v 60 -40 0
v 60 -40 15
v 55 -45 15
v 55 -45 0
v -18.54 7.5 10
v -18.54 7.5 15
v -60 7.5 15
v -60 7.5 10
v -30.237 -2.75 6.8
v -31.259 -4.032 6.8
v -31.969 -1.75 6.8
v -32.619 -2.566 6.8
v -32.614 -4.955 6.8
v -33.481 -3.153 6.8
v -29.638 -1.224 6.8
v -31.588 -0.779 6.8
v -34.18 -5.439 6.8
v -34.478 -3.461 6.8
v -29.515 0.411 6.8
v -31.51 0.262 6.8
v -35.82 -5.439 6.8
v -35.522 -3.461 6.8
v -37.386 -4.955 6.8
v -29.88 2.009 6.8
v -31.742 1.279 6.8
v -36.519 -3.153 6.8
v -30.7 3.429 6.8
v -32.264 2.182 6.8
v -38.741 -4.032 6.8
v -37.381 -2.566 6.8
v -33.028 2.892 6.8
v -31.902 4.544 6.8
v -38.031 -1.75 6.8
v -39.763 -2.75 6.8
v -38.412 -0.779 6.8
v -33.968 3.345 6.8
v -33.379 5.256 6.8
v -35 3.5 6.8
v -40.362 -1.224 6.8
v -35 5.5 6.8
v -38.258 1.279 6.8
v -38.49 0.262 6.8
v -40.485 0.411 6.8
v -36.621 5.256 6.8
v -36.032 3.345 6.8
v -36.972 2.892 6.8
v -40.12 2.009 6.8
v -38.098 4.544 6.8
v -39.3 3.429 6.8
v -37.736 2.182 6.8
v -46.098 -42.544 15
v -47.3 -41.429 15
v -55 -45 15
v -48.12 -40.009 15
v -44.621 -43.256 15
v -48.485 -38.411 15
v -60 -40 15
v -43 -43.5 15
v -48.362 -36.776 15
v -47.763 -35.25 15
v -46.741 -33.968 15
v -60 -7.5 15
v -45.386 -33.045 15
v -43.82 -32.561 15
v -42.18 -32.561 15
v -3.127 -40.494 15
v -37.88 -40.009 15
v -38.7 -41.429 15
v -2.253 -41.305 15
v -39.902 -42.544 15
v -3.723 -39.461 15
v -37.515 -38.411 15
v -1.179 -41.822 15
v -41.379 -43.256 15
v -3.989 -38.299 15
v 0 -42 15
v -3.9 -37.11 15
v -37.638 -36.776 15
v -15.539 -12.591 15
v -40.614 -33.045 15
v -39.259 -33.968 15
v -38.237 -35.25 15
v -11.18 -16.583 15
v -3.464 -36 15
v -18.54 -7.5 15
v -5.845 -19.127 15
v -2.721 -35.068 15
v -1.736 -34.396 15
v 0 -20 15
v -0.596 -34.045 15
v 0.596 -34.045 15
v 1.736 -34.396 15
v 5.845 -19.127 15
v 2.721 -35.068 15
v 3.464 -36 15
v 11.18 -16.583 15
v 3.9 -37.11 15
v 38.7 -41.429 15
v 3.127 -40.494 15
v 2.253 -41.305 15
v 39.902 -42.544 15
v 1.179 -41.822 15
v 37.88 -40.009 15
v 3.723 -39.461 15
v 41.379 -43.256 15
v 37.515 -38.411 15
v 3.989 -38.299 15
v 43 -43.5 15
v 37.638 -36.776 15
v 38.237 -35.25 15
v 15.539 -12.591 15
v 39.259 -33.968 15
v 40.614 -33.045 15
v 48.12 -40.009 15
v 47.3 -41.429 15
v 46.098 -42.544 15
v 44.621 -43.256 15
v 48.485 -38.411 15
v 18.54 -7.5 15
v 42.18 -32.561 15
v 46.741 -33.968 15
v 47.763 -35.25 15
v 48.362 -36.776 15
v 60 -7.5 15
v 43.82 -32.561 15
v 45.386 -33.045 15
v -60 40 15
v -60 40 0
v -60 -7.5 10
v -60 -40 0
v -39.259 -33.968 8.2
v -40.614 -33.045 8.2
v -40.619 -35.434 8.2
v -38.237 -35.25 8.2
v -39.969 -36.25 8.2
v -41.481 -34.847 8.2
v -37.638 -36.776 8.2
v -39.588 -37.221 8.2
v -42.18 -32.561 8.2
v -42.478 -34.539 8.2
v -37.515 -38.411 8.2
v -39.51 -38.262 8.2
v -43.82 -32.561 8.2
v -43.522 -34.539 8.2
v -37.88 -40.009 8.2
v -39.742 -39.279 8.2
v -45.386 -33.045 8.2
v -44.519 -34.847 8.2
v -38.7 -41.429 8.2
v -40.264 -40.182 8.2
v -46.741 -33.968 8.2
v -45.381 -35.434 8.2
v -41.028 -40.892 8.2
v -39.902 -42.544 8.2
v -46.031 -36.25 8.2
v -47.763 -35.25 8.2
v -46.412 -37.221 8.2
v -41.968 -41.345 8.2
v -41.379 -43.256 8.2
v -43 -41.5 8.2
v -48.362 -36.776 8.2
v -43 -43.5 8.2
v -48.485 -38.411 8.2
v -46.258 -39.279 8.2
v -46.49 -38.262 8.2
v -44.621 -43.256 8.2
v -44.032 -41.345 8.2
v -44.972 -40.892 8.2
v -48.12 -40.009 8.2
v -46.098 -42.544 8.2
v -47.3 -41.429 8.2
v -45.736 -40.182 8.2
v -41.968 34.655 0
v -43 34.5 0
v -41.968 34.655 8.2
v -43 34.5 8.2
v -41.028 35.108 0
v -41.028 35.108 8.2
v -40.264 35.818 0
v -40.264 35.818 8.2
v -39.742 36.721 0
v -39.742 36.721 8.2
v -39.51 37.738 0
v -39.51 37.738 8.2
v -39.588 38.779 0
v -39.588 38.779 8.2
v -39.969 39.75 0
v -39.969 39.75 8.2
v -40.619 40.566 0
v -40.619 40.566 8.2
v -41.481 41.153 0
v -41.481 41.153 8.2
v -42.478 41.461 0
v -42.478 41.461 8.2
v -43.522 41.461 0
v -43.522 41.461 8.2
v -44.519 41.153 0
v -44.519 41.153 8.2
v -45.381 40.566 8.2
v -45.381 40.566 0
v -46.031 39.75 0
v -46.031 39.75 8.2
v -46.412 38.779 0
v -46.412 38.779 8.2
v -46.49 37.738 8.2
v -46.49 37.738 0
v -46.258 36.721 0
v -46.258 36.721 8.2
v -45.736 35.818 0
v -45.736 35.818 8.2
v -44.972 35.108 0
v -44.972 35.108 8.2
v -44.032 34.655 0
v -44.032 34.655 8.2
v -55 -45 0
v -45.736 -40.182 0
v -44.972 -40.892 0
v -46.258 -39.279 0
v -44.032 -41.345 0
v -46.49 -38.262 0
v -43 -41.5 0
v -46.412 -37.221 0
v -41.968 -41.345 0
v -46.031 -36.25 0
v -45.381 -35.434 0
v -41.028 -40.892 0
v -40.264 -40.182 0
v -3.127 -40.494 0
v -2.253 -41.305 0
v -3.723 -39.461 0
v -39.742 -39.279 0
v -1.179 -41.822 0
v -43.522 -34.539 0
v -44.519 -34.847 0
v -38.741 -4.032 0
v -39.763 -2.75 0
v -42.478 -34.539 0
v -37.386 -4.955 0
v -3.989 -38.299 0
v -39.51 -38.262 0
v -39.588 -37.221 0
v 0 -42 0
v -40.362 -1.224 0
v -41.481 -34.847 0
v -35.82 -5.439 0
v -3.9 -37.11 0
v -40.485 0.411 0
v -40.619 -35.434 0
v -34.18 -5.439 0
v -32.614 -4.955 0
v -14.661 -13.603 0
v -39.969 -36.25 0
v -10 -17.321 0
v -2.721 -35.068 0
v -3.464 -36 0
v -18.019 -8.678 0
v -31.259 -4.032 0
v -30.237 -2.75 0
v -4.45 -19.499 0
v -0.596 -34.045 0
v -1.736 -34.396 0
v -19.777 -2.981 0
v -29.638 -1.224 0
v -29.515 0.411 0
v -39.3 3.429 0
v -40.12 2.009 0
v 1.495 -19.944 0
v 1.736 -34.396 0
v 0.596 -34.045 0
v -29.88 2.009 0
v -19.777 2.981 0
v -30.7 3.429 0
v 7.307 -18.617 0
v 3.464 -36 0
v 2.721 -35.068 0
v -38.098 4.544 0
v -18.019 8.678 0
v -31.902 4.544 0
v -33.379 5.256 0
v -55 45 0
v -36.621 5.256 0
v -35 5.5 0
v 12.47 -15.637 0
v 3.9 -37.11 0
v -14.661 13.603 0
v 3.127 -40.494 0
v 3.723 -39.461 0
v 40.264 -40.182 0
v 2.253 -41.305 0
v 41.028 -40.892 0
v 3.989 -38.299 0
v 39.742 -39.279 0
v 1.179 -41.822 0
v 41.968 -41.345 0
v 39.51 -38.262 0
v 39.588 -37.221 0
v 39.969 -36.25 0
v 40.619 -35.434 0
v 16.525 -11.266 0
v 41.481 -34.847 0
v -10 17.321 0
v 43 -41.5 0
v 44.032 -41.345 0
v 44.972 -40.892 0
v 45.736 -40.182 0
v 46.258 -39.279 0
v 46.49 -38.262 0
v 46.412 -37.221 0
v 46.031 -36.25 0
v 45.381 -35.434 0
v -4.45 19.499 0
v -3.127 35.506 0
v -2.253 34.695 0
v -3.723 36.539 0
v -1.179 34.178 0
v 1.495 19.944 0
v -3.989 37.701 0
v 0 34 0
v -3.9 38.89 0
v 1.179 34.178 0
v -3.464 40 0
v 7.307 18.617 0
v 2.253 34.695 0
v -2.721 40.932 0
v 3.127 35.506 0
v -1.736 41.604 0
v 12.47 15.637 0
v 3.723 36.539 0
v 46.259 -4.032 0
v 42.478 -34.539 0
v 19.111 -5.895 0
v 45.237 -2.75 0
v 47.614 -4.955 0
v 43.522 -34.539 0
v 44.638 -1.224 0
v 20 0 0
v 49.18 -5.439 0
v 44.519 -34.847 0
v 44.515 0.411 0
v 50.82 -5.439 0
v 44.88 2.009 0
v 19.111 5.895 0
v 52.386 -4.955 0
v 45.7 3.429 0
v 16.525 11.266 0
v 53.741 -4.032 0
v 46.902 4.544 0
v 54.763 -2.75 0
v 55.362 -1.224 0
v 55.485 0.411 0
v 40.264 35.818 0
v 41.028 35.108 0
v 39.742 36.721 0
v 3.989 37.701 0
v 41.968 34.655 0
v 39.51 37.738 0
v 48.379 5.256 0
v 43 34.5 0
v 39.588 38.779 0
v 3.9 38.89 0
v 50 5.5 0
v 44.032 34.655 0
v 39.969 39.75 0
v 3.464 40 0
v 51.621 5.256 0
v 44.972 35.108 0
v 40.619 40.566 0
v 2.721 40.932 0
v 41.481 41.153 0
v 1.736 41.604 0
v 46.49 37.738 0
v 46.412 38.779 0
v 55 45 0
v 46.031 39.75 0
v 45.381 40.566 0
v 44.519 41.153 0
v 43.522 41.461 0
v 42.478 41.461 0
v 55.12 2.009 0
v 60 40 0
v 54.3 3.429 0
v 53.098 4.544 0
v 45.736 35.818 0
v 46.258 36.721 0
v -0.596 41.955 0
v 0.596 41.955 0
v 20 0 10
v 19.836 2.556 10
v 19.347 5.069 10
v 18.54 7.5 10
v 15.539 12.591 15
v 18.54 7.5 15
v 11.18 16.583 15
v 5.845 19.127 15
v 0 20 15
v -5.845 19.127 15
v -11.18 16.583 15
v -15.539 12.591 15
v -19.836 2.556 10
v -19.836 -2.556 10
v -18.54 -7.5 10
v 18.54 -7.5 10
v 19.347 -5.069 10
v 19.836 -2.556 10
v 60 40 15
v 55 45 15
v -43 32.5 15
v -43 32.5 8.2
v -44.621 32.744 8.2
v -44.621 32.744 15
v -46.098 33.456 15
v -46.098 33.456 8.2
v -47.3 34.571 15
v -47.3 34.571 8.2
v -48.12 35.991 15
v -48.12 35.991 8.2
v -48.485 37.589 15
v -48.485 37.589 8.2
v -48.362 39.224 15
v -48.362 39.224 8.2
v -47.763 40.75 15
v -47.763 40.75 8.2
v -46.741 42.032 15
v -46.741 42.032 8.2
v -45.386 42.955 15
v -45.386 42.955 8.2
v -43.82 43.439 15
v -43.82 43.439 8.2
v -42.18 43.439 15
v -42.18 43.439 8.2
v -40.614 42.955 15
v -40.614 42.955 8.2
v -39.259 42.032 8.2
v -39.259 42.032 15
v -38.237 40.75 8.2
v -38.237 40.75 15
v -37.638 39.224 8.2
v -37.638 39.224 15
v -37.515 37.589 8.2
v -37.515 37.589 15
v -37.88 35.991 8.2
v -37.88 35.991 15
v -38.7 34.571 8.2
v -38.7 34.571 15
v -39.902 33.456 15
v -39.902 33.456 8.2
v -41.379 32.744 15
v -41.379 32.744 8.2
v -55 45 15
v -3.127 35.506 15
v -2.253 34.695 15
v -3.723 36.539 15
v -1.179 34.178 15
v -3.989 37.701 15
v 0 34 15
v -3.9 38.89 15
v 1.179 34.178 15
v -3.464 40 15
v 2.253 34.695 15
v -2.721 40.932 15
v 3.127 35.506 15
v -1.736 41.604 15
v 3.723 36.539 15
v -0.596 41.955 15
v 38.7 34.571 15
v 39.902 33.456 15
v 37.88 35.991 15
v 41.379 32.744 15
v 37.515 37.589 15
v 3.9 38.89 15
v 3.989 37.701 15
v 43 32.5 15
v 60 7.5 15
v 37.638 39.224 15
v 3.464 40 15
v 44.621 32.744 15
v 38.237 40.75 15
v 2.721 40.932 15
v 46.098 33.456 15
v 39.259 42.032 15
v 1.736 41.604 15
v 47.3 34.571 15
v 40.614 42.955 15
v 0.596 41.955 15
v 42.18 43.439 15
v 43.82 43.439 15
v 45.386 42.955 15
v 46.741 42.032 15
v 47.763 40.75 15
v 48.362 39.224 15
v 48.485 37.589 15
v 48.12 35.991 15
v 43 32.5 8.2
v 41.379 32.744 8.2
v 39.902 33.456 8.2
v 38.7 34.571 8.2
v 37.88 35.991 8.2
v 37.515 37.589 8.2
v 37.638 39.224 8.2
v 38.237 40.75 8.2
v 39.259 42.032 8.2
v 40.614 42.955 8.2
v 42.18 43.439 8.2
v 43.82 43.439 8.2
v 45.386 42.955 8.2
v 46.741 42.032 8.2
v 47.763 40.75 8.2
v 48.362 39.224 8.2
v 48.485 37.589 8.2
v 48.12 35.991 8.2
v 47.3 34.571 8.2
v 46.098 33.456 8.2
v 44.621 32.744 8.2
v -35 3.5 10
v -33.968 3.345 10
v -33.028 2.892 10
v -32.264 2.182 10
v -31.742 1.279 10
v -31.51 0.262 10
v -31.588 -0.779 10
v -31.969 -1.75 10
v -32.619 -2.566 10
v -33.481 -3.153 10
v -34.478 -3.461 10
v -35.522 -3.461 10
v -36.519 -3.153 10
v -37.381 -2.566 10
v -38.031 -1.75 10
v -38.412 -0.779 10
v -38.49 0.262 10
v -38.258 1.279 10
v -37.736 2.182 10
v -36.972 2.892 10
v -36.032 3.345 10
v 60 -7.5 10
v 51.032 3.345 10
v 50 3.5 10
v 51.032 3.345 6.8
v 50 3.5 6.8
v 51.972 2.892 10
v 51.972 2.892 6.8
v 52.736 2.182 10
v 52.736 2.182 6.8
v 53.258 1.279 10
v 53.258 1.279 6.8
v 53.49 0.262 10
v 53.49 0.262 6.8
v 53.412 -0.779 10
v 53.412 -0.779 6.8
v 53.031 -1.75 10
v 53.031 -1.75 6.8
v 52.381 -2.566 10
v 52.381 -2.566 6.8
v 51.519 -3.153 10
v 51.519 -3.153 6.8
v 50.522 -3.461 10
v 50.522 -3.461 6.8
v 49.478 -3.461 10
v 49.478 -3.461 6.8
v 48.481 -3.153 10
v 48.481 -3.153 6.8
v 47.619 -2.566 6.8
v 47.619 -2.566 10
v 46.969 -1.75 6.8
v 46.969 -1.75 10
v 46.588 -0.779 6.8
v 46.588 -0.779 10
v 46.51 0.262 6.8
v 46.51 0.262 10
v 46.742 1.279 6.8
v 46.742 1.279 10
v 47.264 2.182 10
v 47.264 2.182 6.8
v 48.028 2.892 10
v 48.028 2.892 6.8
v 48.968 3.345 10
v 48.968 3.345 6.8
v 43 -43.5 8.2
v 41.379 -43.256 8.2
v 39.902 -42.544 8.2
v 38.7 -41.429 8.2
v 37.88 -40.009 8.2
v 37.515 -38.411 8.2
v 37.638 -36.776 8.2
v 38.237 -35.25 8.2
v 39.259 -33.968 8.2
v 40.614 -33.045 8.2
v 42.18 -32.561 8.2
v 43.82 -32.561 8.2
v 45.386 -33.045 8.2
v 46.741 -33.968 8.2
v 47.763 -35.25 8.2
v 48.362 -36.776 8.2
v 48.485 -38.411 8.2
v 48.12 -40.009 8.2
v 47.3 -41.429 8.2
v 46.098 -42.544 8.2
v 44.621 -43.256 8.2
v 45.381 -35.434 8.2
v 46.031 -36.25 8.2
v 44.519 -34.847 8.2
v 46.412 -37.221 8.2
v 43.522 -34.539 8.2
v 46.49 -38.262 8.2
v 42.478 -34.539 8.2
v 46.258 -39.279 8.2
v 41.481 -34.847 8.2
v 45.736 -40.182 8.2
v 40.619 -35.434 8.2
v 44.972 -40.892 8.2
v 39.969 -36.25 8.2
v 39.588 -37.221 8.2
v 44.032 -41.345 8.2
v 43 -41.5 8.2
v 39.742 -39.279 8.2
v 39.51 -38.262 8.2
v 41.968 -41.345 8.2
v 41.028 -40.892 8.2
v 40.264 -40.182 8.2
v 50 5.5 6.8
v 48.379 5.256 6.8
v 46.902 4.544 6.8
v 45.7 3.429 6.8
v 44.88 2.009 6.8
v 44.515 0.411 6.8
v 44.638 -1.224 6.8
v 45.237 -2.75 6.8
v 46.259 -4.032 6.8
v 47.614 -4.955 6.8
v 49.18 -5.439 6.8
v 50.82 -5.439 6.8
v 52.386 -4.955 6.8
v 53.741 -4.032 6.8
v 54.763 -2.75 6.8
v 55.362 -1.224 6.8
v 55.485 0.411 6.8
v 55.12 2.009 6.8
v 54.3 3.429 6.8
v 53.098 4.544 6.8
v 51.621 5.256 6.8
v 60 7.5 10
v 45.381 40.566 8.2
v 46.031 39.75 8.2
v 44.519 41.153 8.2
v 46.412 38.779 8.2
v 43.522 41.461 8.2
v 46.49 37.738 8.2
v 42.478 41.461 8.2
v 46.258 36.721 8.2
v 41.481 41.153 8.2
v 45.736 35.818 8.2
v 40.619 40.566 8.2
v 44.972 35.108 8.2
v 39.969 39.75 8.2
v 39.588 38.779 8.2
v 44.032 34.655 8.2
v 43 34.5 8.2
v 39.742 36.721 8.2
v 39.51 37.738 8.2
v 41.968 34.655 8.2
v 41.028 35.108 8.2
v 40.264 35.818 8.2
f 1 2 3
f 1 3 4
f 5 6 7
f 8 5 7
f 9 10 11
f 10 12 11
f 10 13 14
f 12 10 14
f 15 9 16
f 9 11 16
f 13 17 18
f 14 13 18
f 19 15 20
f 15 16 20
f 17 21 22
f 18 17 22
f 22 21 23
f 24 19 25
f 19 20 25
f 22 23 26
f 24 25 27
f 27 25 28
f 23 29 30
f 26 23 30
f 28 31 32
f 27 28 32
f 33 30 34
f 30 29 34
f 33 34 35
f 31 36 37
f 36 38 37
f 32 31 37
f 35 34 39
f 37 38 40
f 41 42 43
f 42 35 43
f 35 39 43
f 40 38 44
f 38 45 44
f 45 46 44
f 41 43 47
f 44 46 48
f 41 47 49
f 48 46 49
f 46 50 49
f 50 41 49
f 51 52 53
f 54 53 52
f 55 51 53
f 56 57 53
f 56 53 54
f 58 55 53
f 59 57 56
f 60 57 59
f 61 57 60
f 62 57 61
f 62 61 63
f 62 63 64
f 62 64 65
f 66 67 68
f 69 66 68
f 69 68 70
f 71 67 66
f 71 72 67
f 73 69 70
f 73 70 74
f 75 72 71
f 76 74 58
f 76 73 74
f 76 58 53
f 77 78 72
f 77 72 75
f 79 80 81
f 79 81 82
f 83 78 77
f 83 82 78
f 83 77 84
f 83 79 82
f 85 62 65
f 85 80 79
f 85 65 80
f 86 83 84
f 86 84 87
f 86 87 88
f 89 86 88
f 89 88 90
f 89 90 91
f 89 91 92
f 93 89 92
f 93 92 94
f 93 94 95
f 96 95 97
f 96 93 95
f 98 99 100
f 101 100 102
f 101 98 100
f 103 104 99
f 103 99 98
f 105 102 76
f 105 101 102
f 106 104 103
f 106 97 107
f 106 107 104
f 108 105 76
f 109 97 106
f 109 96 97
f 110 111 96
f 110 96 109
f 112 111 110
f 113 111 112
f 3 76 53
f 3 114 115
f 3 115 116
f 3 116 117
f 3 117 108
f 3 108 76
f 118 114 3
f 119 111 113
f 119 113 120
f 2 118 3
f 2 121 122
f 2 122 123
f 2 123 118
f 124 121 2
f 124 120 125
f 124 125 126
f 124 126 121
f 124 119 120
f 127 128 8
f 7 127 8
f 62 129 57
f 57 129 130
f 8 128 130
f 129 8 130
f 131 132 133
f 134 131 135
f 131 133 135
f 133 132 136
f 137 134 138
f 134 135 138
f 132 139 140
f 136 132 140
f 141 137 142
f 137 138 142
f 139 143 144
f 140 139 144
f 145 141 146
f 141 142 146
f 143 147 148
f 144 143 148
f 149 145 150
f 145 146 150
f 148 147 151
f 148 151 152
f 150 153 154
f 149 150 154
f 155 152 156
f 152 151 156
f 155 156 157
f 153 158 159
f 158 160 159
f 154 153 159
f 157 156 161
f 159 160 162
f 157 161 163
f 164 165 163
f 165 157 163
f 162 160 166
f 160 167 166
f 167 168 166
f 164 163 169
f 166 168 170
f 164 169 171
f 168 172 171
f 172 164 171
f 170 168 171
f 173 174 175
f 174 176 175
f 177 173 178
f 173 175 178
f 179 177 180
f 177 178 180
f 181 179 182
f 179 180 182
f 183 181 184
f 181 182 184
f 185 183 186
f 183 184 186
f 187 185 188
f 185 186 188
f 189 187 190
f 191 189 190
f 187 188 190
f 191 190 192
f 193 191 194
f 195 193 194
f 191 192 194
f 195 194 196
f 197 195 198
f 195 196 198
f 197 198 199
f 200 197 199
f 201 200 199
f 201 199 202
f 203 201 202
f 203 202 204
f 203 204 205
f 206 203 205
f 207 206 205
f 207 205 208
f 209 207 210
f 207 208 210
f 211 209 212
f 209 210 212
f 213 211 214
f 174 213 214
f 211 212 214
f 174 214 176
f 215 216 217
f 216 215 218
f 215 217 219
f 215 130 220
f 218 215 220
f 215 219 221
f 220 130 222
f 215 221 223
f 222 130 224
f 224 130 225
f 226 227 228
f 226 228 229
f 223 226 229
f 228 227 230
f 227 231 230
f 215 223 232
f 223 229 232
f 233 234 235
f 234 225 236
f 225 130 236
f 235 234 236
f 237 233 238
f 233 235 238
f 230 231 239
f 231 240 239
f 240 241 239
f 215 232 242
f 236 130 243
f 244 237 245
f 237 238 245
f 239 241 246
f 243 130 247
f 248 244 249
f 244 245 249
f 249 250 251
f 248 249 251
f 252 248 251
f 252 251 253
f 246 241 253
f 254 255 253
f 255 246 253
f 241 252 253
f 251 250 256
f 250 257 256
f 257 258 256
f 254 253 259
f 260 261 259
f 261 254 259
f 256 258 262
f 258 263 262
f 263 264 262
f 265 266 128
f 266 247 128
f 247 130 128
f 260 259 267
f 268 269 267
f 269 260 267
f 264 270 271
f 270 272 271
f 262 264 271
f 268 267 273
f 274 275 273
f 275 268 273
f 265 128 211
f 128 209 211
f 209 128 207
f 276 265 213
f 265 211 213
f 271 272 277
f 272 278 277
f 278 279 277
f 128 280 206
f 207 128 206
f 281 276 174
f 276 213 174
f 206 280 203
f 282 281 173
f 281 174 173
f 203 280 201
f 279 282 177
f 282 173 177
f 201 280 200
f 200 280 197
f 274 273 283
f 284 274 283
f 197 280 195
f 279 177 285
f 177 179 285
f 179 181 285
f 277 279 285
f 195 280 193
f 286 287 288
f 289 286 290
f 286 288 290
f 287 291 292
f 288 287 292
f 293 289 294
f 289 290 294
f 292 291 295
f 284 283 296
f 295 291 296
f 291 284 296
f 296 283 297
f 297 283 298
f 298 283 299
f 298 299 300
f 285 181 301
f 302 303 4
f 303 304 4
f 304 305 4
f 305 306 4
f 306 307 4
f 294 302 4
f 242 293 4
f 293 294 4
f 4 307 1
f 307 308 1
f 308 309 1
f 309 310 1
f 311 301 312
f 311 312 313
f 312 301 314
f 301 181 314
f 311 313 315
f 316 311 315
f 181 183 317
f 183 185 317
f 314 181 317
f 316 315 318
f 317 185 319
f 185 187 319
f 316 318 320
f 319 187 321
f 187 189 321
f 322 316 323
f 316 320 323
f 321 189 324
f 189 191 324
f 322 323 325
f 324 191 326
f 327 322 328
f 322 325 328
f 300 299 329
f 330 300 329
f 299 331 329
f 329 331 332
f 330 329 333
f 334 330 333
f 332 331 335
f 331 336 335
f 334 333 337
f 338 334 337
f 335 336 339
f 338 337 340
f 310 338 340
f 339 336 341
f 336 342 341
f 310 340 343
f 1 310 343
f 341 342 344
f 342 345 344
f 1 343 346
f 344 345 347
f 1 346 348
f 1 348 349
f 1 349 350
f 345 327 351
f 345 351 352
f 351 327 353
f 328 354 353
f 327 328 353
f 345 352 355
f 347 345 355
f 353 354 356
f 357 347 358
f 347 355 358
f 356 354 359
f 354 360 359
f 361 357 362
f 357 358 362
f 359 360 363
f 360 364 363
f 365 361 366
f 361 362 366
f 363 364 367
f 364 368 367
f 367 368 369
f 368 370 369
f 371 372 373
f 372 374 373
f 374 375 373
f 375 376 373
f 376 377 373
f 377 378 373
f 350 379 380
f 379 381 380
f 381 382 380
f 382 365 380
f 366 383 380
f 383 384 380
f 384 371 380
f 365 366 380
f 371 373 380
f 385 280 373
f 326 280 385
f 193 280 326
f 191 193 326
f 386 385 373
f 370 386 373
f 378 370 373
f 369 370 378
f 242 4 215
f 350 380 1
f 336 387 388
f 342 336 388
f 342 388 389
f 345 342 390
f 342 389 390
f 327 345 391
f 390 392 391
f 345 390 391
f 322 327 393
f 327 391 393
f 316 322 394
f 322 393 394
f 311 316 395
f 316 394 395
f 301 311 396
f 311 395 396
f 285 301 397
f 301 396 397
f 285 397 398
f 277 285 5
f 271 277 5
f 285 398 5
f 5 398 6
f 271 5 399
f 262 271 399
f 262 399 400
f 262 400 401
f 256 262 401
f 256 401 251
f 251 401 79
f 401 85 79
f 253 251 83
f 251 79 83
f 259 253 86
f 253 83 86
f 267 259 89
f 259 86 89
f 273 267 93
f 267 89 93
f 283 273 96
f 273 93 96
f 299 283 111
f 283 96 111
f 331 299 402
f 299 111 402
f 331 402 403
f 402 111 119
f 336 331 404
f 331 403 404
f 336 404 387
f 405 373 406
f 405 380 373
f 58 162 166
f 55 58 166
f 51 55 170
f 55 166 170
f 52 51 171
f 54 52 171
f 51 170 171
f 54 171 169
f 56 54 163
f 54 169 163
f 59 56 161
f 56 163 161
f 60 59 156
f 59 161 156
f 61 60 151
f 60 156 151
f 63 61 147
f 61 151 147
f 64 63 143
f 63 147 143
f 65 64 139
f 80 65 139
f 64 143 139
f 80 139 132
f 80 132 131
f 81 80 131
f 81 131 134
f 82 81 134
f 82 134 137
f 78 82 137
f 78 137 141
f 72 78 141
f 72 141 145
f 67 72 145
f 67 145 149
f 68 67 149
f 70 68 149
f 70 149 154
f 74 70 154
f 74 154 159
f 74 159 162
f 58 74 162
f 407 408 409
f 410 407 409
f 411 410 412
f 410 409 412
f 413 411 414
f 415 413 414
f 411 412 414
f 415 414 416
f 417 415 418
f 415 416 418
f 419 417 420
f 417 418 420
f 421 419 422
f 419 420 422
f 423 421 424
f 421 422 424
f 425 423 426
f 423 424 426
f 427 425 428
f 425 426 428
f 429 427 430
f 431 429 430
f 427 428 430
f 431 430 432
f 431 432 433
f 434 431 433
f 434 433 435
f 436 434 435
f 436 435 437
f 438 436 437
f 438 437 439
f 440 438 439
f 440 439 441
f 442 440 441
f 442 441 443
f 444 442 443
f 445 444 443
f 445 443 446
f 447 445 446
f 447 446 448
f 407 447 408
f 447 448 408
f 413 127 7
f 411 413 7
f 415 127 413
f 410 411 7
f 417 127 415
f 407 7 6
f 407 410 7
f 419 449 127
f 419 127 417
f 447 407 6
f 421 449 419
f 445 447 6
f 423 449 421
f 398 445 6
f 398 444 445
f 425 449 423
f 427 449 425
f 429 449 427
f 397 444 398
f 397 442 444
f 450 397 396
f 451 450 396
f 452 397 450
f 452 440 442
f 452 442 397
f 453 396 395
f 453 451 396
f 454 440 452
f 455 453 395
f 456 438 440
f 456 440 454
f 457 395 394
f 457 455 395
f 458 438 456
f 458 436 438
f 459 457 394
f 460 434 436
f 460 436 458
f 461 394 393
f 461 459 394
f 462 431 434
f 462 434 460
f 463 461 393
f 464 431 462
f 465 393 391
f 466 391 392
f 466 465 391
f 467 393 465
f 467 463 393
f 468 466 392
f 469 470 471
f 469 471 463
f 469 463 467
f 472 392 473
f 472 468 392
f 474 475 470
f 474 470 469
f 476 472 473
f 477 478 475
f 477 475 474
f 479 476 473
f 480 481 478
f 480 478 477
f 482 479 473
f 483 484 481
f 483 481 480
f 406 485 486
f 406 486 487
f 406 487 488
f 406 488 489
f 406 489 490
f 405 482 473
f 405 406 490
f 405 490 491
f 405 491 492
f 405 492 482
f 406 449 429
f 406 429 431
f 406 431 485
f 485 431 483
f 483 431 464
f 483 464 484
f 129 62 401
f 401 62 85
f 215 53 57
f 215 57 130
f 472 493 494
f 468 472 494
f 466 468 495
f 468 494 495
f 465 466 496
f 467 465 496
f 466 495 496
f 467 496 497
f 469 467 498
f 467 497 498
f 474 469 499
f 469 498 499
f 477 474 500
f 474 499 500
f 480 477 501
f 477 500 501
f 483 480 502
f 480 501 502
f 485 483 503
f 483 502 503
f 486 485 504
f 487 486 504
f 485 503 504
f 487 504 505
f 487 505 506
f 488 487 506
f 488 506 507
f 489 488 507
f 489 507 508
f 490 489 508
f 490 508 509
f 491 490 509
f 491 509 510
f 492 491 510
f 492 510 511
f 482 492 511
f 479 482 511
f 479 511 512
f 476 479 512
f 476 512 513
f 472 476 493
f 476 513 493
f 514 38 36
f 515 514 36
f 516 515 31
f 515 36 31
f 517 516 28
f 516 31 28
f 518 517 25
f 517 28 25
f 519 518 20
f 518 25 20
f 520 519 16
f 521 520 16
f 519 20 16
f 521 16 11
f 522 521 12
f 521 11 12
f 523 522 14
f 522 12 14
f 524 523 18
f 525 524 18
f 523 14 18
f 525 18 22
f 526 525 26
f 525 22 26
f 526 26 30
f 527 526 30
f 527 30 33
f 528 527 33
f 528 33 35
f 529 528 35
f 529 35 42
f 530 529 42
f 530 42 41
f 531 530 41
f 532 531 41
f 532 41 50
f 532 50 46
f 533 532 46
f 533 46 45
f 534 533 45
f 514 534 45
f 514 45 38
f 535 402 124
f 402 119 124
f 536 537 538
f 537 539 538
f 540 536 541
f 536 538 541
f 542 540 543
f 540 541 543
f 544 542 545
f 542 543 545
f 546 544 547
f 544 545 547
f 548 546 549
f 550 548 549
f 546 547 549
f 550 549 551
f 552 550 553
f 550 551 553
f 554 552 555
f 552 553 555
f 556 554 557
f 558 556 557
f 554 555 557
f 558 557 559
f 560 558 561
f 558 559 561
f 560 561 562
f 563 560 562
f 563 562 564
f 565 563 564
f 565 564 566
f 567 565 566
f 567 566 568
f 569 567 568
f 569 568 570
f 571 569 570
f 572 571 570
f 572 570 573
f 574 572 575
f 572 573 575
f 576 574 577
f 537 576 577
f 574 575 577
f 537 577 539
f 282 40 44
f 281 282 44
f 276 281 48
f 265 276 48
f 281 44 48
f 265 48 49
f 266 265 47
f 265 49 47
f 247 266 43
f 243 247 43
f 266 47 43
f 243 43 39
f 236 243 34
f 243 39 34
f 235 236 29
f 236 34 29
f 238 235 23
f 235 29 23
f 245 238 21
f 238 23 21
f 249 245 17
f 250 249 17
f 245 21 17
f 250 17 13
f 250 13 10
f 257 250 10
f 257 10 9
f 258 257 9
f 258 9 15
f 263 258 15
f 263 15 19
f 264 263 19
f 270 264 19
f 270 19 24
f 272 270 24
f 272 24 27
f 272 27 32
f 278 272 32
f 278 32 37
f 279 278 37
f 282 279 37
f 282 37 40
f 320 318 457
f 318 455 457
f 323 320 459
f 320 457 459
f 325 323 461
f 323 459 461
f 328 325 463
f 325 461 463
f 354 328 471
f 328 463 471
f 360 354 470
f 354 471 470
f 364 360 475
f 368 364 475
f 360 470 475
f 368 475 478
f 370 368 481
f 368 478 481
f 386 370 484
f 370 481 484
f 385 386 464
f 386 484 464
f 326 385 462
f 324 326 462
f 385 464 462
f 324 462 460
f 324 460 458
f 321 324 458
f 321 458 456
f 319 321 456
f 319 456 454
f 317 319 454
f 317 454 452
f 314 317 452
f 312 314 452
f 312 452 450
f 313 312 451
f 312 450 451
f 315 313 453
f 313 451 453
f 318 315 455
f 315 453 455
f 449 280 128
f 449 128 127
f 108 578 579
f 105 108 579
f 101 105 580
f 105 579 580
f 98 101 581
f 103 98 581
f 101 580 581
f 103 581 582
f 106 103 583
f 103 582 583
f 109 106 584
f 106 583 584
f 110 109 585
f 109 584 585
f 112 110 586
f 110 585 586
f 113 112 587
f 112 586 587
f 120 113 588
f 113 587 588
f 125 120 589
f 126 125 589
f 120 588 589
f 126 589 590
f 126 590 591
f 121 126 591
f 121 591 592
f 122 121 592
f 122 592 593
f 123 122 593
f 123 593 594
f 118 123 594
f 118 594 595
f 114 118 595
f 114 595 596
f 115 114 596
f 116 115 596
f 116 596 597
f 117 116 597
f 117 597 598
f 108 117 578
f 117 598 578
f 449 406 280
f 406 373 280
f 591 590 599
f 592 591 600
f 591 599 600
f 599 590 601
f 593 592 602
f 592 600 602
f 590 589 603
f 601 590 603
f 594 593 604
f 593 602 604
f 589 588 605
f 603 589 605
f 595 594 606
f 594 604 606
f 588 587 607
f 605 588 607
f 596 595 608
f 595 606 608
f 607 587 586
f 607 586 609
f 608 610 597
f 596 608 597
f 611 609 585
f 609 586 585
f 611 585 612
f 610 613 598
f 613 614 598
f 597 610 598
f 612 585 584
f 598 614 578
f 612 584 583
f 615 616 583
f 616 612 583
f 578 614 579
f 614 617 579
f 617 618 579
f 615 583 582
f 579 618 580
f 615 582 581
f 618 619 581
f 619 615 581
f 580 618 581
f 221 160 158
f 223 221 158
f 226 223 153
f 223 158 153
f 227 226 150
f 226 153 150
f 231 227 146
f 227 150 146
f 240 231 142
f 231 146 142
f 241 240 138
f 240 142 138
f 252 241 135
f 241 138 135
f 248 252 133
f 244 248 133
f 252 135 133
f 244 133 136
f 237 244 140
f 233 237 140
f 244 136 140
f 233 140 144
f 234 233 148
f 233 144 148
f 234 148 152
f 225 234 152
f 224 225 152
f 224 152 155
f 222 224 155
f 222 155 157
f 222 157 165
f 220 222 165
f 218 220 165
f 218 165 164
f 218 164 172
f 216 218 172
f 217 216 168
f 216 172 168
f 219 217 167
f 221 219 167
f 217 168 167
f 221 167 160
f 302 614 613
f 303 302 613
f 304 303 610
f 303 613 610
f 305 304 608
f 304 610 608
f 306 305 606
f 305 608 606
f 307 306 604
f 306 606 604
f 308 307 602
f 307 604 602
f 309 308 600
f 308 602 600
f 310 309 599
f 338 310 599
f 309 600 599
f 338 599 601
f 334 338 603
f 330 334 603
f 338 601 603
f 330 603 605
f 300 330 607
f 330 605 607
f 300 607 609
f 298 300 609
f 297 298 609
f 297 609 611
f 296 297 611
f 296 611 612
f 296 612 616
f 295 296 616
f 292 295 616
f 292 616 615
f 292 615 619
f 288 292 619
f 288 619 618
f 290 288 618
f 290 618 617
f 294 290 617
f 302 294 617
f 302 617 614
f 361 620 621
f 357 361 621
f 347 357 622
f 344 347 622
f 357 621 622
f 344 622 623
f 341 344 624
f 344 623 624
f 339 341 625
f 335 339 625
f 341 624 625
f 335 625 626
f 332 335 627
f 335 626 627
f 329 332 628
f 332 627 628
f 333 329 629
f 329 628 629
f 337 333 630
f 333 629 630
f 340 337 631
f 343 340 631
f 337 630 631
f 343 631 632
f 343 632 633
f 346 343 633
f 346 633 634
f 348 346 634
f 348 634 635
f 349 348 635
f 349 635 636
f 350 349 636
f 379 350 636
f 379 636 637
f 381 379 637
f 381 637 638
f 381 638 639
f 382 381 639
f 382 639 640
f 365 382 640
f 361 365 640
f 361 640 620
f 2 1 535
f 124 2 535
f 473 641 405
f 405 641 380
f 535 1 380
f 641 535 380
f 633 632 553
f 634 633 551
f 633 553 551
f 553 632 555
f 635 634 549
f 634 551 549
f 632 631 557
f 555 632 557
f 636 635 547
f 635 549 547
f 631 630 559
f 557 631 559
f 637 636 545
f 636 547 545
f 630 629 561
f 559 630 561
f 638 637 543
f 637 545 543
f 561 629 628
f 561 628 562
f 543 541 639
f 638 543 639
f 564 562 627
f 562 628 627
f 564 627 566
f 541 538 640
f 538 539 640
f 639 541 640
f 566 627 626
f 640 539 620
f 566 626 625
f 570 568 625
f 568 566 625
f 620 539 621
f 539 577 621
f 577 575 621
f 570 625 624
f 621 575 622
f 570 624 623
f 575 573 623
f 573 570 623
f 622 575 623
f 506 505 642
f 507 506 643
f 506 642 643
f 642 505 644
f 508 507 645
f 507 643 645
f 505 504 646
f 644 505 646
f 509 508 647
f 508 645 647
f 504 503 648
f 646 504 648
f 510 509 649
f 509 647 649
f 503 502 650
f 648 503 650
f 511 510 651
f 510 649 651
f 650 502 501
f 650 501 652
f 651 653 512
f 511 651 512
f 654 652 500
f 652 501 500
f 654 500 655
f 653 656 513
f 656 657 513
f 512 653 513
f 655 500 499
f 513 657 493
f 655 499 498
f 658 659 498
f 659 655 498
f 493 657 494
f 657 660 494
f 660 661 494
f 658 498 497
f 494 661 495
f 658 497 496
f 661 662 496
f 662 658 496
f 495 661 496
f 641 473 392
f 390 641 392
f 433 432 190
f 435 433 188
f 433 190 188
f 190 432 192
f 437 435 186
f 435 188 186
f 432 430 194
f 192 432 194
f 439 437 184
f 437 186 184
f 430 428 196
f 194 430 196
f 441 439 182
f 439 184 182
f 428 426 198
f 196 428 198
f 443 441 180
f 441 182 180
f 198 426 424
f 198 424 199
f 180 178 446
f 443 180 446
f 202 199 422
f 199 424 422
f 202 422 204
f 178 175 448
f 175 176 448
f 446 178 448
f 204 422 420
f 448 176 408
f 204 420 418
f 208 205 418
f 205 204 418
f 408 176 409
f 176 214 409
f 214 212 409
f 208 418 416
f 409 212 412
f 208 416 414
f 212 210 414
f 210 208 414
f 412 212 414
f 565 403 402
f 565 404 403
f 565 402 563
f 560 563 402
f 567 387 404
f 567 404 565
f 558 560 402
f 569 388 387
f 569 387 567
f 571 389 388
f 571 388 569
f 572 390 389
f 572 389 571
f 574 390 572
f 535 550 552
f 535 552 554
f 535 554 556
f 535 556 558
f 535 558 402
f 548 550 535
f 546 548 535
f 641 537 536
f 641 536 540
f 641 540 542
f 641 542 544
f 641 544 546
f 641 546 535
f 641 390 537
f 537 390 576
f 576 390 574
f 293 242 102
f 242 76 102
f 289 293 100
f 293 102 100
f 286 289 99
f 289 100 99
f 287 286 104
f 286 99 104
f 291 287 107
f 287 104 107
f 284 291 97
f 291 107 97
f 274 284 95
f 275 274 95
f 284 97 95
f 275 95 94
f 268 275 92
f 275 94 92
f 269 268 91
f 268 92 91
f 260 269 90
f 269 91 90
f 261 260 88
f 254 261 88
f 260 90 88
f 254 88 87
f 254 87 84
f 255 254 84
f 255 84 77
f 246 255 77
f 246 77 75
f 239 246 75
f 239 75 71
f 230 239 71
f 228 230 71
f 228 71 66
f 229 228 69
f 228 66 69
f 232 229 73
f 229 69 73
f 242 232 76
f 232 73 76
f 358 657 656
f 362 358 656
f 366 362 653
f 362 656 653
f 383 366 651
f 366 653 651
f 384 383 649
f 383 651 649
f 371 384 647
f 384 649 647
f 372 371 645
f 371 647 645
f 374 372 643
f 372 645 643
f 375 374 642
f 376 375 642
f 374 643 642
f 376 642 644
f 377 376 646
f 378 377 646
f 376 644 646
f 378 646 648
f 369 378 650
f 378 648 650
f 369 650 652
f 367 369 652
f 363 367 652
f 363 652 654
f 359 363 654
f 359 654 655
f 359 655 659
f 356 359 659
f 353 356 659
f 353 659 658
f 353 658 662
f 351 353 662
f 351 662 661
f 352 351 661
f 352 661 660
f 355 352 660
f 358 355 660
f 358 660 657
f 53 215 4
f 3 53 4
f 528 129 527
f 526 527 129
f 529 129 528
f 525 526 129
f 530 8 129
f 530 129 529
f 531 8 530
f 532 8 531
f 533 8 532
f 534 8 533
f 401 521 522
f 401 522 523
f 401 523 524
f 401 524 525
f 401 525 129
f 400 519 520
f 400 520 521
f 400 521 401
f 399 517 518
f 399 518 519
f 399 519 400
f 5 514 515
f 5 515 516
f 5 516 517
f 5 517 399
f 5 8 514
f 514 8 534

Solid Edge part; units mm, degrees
sketch "Sketch1" plane through (0, 0, 0) normal (0, 0, 1) x (1, 0, 0)
  line L0 (-60, 45) -> (-60, -45)
  line L1 (-60, -45) -> (60, -45)
  line L2 (60, -45) -> (60, 45)
  line L3 (60, 45) -> (-60, 45)
extrude "Protrusion1" add sketch "Sketch1" along normal blind 15
sketch "Sketch2" plane through (0, 0, 15) normal (0, 0, 1) x (1, 0, 0)
  circle A0 centre (0, 0) radius 20
  dimension "D1" = 60
  dimension "D2" = 40
extrude "Cutout1" cut sketch "Sketch2" against normal through all
sketch "Sketch3" plane through (0, 0, 15) normal (0, 0, 1) x (1, 0, 0)
  line L0 (-60, -7.5) -> (110, -7.5)
  line L1 (110, -7.5) -> (110, 7.5)
  line L2 (110, 7.5) -> (-60, 7.5)
  line L3 (-60, 7.5) -> (-60, -7.5)
  dimension "D1" = 15
  dimension "D2" = 170
  dimension "D3" = 45
extrude "VaciadoExtruido_2" cut sketch "Sketch3" against normal blind 5
chamfer "Chaflán_1" distance 5 angle 45 4 edges at (-60, 45, 7.5) (60, 45, 7.5) (60, -45, 7.5) (-60, -45, 7.5)
hole "Agujero_1" [suppressed]
hole "Hole1" at (-35, 0, 0) direction (0, 0, 1) diameter 7 end up to next counterbore diameter 11 counterbore depth 6.8
hole "Hole2" at (50, 0, 0) direction (0, 0, 1) diameter 7 end up to next counterbore diameter 11 counterbore depth 6.8
hole "Agujero_4" at (-43, 38, 15) direction (0, 0, -1) diameter 7 end up to next counterbore diameter 11 counterbore depth 6.8
hole "Hole3" at (43, 38, 15) direction (0, 0, -1) diameter 7 end up to next counterbore diameter 11 counterbore depth 6.8
hole "Hole4" at (43, -38, 15) direction (0, 0, -1) diameter 7 end up to next counterbore diameter 11 counterbore depth 6.8
hole "Hole5" at (-43, -38, 15) direction (0, 0, -1) diameter 7 end up to next counterbore diameter 11 counterbore depth 6.8
hole "Agujero_8" at (0, 38, 15) direction (0, 0, -1) diameter 8 end up to next
hole "Hole6" at (0, -38, 15) direction (0, 0, -1) diameter 8 end up to next
properties part number "1976-1200-002" material "Aluminio, 7075-T6"
